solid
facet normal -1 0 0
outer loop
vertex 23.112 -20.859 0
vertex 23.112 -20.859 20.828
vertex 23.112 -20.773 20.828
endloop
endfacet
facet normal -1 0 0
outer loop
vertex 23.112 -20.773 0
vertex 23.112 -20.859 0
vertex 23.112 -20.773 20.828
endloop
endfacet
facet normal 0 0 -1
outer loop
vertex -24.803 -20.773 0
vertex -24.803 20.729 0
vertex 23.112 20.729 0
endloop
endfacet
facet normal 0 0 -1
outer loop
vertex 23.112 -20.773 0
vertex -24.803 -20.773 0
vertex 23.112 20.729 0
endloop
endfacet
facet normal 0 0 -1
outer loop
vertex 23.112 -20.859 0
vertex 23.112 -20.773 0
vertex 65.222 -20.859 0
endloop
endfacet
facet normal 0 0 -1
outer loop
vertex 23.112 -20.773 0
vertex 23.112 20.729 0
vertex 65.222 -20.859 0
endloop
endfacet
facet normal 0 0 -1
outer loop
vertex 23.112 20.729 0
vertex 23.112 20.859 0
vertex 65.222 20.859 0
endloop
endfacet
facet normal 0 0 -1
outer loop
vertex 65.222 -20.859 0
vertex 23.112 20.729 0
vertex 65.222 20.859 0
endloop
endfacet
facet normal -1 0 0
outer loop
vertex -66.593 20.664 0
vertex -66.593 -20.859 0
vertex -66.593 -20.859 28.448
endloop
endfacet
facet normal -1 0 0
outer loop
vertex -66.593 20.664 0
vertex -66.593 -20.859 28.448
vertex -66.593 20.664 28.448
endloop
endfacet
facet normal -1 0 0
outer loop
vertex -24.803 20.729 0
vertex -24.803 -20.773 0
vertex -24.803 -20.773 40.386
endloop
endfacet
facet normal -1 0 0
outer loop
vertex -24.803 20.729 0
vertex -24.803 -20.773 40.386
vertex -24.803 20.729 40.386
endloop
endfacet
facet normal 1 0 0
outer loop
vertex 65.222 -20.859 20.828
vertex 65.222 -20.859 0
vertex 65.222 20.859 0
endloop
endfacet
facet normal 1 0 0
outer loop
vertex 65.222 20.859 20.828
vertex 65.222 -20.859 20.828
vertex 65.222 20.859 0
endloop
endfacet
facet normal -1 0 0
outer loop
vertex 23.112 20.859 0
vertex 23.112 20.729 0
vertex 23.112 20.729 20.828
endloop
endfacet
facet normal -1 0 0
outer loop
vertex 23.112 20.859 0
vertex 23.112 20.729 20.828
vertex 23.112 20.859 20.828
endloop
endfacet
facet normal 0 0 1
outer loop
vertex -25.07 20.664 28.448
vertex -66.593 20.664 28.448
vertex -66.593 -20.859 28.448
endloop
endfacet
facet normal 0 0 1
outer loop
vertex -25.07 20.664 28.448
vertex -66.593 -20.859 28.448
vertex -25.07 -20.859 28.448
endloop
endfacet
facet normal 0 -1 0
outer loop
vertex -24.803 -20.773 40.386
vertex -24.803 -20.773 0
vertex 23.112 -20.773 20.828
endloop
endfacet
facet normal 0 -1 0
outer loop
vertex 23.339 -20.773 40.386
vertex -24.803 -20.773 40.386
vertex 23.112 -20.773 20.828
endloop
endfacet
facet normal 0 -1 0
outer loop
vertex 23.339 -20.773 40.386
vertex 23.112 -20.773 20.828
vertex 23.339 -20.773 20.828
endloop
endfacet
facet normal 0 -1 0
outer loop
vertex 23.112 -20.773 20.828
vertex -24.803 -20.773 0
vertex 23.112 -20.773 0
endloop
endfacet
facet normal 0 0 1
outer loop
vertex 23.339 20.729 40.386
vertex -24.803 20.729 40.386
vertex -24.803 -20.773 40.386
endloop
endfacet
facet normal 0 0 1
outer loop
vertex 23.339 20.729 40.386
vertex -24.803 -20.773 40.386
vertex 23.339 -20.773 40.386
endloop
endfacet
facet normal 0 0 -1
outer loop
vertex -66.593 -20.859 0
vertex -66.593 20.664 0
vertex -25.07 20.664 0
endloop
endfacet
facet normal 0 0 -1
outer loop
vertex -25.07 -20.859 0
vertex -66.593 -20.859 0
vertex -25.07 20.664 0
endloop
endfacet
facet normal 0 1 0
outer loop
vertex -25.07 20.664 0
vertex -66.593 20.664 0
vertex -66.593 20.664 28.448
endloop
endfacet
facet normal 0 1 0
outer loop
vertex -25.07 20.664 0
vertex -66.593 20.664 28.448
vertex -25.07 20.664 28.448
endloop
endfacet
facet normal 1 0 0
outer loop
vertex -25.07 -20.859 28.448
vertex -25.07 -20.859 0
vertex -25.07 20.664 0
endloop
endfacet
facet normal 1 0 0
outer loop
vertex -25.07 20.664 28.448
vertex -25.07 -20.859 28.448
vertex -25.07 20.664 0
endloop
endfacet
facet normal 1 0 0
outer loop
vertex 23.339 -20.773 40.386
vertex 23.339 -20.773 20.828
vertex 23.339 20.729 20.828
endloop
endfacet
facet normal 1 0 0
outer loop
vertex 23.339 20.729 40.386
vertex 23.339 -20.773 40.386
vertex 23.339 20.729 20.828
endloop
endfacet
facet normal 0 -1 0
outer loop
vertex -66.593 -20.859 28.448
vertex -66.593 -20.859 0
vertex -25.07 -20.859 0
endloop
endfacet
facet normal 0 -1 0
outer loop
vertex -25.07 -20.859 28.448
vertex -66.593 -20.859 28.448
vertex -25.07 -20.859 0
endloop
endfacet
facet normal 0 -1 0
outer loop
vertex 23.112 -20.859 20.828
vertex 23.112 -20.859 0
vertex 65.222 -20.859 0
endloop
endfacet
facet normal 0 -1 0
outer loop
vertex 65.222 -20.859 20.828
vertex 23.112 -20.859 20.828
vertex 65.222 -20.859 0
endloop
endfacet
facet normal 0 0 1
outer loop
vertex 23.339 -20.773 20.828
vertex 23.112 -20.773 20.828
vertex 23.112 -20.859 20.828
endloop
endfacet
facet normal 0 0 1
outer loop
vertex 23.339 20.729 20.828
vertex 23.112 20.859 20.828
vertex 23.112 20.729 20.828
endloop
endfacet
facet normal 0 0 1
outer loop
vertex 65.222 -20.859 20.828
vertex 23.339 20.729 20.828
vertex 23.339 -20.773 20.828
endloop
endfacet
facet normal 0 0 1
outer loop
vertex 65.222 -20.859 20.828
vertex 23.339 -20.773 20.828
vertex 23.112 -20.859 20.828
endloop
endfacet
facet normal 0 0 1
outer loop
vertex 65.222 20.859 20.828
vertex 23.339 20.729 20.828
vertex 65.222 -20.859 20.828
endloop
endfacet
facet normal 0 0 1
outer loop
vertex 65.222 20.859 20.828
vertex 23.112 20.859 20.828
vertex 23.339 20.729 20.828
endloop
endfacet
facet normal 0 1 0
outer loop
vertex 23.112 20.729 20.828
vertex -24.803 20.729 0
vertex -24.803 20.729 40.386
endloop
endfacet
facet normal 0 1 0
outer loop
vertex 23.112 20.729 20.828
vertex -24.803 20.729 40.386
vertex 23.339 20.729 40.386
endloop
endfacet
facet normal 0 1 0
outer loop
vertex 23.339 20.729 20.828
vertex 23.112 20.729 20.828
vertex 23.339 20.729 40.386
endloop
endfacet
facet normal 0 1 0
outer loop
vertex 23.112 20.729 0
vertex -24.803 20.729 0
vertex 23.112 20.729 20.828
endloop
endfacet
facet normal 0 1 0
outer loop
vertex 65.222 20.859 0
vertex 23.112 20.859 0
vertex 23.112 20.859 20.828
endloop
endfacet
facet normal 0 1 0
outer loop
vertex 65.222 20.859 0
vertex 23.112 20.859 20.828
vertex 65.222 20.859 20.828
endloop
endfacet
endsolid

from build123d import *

# Parameters (mm, degrees)
F0_W     = 48.142213
F0_H     = 41.501908
F1_DEPTH = 40.386
F2_W     = 41.522941
F2_H     = 41.522937
F3_DEPTH = 28.448
F4_W     = 42.110531
F4_H     = 41.7188
F5_DEPTH = 20.828


with BuildPart() as f1:
    # F0 (on Top) → F1 (new body)
    with BuildSketch(Plane.XY):
        with Locations((-0.731738, -0.021794)):
            Rectangle(F0_W, F0_H)
    extrude(amount=F1_DEPTH)

    # F4 (on Top) → F5 (join)
    with BuildSketch(Plane.XY):
        with Locations((44.167088, 0)):
            Rectangle(F4_W, F4_H)
    extrude(amount=F5_DEPTH)


with BuildPart() as f3:
    # F2 (on Top) → F3 (new body)
    with BuildSketch(Plane.XY):
        with Locations((-45.831924, -0.097932)):
            Rectangle(F2_W, F2_H)
    extrude(amount=F3_DEPTH)


solid = Compound([f1.part, f3.part])
